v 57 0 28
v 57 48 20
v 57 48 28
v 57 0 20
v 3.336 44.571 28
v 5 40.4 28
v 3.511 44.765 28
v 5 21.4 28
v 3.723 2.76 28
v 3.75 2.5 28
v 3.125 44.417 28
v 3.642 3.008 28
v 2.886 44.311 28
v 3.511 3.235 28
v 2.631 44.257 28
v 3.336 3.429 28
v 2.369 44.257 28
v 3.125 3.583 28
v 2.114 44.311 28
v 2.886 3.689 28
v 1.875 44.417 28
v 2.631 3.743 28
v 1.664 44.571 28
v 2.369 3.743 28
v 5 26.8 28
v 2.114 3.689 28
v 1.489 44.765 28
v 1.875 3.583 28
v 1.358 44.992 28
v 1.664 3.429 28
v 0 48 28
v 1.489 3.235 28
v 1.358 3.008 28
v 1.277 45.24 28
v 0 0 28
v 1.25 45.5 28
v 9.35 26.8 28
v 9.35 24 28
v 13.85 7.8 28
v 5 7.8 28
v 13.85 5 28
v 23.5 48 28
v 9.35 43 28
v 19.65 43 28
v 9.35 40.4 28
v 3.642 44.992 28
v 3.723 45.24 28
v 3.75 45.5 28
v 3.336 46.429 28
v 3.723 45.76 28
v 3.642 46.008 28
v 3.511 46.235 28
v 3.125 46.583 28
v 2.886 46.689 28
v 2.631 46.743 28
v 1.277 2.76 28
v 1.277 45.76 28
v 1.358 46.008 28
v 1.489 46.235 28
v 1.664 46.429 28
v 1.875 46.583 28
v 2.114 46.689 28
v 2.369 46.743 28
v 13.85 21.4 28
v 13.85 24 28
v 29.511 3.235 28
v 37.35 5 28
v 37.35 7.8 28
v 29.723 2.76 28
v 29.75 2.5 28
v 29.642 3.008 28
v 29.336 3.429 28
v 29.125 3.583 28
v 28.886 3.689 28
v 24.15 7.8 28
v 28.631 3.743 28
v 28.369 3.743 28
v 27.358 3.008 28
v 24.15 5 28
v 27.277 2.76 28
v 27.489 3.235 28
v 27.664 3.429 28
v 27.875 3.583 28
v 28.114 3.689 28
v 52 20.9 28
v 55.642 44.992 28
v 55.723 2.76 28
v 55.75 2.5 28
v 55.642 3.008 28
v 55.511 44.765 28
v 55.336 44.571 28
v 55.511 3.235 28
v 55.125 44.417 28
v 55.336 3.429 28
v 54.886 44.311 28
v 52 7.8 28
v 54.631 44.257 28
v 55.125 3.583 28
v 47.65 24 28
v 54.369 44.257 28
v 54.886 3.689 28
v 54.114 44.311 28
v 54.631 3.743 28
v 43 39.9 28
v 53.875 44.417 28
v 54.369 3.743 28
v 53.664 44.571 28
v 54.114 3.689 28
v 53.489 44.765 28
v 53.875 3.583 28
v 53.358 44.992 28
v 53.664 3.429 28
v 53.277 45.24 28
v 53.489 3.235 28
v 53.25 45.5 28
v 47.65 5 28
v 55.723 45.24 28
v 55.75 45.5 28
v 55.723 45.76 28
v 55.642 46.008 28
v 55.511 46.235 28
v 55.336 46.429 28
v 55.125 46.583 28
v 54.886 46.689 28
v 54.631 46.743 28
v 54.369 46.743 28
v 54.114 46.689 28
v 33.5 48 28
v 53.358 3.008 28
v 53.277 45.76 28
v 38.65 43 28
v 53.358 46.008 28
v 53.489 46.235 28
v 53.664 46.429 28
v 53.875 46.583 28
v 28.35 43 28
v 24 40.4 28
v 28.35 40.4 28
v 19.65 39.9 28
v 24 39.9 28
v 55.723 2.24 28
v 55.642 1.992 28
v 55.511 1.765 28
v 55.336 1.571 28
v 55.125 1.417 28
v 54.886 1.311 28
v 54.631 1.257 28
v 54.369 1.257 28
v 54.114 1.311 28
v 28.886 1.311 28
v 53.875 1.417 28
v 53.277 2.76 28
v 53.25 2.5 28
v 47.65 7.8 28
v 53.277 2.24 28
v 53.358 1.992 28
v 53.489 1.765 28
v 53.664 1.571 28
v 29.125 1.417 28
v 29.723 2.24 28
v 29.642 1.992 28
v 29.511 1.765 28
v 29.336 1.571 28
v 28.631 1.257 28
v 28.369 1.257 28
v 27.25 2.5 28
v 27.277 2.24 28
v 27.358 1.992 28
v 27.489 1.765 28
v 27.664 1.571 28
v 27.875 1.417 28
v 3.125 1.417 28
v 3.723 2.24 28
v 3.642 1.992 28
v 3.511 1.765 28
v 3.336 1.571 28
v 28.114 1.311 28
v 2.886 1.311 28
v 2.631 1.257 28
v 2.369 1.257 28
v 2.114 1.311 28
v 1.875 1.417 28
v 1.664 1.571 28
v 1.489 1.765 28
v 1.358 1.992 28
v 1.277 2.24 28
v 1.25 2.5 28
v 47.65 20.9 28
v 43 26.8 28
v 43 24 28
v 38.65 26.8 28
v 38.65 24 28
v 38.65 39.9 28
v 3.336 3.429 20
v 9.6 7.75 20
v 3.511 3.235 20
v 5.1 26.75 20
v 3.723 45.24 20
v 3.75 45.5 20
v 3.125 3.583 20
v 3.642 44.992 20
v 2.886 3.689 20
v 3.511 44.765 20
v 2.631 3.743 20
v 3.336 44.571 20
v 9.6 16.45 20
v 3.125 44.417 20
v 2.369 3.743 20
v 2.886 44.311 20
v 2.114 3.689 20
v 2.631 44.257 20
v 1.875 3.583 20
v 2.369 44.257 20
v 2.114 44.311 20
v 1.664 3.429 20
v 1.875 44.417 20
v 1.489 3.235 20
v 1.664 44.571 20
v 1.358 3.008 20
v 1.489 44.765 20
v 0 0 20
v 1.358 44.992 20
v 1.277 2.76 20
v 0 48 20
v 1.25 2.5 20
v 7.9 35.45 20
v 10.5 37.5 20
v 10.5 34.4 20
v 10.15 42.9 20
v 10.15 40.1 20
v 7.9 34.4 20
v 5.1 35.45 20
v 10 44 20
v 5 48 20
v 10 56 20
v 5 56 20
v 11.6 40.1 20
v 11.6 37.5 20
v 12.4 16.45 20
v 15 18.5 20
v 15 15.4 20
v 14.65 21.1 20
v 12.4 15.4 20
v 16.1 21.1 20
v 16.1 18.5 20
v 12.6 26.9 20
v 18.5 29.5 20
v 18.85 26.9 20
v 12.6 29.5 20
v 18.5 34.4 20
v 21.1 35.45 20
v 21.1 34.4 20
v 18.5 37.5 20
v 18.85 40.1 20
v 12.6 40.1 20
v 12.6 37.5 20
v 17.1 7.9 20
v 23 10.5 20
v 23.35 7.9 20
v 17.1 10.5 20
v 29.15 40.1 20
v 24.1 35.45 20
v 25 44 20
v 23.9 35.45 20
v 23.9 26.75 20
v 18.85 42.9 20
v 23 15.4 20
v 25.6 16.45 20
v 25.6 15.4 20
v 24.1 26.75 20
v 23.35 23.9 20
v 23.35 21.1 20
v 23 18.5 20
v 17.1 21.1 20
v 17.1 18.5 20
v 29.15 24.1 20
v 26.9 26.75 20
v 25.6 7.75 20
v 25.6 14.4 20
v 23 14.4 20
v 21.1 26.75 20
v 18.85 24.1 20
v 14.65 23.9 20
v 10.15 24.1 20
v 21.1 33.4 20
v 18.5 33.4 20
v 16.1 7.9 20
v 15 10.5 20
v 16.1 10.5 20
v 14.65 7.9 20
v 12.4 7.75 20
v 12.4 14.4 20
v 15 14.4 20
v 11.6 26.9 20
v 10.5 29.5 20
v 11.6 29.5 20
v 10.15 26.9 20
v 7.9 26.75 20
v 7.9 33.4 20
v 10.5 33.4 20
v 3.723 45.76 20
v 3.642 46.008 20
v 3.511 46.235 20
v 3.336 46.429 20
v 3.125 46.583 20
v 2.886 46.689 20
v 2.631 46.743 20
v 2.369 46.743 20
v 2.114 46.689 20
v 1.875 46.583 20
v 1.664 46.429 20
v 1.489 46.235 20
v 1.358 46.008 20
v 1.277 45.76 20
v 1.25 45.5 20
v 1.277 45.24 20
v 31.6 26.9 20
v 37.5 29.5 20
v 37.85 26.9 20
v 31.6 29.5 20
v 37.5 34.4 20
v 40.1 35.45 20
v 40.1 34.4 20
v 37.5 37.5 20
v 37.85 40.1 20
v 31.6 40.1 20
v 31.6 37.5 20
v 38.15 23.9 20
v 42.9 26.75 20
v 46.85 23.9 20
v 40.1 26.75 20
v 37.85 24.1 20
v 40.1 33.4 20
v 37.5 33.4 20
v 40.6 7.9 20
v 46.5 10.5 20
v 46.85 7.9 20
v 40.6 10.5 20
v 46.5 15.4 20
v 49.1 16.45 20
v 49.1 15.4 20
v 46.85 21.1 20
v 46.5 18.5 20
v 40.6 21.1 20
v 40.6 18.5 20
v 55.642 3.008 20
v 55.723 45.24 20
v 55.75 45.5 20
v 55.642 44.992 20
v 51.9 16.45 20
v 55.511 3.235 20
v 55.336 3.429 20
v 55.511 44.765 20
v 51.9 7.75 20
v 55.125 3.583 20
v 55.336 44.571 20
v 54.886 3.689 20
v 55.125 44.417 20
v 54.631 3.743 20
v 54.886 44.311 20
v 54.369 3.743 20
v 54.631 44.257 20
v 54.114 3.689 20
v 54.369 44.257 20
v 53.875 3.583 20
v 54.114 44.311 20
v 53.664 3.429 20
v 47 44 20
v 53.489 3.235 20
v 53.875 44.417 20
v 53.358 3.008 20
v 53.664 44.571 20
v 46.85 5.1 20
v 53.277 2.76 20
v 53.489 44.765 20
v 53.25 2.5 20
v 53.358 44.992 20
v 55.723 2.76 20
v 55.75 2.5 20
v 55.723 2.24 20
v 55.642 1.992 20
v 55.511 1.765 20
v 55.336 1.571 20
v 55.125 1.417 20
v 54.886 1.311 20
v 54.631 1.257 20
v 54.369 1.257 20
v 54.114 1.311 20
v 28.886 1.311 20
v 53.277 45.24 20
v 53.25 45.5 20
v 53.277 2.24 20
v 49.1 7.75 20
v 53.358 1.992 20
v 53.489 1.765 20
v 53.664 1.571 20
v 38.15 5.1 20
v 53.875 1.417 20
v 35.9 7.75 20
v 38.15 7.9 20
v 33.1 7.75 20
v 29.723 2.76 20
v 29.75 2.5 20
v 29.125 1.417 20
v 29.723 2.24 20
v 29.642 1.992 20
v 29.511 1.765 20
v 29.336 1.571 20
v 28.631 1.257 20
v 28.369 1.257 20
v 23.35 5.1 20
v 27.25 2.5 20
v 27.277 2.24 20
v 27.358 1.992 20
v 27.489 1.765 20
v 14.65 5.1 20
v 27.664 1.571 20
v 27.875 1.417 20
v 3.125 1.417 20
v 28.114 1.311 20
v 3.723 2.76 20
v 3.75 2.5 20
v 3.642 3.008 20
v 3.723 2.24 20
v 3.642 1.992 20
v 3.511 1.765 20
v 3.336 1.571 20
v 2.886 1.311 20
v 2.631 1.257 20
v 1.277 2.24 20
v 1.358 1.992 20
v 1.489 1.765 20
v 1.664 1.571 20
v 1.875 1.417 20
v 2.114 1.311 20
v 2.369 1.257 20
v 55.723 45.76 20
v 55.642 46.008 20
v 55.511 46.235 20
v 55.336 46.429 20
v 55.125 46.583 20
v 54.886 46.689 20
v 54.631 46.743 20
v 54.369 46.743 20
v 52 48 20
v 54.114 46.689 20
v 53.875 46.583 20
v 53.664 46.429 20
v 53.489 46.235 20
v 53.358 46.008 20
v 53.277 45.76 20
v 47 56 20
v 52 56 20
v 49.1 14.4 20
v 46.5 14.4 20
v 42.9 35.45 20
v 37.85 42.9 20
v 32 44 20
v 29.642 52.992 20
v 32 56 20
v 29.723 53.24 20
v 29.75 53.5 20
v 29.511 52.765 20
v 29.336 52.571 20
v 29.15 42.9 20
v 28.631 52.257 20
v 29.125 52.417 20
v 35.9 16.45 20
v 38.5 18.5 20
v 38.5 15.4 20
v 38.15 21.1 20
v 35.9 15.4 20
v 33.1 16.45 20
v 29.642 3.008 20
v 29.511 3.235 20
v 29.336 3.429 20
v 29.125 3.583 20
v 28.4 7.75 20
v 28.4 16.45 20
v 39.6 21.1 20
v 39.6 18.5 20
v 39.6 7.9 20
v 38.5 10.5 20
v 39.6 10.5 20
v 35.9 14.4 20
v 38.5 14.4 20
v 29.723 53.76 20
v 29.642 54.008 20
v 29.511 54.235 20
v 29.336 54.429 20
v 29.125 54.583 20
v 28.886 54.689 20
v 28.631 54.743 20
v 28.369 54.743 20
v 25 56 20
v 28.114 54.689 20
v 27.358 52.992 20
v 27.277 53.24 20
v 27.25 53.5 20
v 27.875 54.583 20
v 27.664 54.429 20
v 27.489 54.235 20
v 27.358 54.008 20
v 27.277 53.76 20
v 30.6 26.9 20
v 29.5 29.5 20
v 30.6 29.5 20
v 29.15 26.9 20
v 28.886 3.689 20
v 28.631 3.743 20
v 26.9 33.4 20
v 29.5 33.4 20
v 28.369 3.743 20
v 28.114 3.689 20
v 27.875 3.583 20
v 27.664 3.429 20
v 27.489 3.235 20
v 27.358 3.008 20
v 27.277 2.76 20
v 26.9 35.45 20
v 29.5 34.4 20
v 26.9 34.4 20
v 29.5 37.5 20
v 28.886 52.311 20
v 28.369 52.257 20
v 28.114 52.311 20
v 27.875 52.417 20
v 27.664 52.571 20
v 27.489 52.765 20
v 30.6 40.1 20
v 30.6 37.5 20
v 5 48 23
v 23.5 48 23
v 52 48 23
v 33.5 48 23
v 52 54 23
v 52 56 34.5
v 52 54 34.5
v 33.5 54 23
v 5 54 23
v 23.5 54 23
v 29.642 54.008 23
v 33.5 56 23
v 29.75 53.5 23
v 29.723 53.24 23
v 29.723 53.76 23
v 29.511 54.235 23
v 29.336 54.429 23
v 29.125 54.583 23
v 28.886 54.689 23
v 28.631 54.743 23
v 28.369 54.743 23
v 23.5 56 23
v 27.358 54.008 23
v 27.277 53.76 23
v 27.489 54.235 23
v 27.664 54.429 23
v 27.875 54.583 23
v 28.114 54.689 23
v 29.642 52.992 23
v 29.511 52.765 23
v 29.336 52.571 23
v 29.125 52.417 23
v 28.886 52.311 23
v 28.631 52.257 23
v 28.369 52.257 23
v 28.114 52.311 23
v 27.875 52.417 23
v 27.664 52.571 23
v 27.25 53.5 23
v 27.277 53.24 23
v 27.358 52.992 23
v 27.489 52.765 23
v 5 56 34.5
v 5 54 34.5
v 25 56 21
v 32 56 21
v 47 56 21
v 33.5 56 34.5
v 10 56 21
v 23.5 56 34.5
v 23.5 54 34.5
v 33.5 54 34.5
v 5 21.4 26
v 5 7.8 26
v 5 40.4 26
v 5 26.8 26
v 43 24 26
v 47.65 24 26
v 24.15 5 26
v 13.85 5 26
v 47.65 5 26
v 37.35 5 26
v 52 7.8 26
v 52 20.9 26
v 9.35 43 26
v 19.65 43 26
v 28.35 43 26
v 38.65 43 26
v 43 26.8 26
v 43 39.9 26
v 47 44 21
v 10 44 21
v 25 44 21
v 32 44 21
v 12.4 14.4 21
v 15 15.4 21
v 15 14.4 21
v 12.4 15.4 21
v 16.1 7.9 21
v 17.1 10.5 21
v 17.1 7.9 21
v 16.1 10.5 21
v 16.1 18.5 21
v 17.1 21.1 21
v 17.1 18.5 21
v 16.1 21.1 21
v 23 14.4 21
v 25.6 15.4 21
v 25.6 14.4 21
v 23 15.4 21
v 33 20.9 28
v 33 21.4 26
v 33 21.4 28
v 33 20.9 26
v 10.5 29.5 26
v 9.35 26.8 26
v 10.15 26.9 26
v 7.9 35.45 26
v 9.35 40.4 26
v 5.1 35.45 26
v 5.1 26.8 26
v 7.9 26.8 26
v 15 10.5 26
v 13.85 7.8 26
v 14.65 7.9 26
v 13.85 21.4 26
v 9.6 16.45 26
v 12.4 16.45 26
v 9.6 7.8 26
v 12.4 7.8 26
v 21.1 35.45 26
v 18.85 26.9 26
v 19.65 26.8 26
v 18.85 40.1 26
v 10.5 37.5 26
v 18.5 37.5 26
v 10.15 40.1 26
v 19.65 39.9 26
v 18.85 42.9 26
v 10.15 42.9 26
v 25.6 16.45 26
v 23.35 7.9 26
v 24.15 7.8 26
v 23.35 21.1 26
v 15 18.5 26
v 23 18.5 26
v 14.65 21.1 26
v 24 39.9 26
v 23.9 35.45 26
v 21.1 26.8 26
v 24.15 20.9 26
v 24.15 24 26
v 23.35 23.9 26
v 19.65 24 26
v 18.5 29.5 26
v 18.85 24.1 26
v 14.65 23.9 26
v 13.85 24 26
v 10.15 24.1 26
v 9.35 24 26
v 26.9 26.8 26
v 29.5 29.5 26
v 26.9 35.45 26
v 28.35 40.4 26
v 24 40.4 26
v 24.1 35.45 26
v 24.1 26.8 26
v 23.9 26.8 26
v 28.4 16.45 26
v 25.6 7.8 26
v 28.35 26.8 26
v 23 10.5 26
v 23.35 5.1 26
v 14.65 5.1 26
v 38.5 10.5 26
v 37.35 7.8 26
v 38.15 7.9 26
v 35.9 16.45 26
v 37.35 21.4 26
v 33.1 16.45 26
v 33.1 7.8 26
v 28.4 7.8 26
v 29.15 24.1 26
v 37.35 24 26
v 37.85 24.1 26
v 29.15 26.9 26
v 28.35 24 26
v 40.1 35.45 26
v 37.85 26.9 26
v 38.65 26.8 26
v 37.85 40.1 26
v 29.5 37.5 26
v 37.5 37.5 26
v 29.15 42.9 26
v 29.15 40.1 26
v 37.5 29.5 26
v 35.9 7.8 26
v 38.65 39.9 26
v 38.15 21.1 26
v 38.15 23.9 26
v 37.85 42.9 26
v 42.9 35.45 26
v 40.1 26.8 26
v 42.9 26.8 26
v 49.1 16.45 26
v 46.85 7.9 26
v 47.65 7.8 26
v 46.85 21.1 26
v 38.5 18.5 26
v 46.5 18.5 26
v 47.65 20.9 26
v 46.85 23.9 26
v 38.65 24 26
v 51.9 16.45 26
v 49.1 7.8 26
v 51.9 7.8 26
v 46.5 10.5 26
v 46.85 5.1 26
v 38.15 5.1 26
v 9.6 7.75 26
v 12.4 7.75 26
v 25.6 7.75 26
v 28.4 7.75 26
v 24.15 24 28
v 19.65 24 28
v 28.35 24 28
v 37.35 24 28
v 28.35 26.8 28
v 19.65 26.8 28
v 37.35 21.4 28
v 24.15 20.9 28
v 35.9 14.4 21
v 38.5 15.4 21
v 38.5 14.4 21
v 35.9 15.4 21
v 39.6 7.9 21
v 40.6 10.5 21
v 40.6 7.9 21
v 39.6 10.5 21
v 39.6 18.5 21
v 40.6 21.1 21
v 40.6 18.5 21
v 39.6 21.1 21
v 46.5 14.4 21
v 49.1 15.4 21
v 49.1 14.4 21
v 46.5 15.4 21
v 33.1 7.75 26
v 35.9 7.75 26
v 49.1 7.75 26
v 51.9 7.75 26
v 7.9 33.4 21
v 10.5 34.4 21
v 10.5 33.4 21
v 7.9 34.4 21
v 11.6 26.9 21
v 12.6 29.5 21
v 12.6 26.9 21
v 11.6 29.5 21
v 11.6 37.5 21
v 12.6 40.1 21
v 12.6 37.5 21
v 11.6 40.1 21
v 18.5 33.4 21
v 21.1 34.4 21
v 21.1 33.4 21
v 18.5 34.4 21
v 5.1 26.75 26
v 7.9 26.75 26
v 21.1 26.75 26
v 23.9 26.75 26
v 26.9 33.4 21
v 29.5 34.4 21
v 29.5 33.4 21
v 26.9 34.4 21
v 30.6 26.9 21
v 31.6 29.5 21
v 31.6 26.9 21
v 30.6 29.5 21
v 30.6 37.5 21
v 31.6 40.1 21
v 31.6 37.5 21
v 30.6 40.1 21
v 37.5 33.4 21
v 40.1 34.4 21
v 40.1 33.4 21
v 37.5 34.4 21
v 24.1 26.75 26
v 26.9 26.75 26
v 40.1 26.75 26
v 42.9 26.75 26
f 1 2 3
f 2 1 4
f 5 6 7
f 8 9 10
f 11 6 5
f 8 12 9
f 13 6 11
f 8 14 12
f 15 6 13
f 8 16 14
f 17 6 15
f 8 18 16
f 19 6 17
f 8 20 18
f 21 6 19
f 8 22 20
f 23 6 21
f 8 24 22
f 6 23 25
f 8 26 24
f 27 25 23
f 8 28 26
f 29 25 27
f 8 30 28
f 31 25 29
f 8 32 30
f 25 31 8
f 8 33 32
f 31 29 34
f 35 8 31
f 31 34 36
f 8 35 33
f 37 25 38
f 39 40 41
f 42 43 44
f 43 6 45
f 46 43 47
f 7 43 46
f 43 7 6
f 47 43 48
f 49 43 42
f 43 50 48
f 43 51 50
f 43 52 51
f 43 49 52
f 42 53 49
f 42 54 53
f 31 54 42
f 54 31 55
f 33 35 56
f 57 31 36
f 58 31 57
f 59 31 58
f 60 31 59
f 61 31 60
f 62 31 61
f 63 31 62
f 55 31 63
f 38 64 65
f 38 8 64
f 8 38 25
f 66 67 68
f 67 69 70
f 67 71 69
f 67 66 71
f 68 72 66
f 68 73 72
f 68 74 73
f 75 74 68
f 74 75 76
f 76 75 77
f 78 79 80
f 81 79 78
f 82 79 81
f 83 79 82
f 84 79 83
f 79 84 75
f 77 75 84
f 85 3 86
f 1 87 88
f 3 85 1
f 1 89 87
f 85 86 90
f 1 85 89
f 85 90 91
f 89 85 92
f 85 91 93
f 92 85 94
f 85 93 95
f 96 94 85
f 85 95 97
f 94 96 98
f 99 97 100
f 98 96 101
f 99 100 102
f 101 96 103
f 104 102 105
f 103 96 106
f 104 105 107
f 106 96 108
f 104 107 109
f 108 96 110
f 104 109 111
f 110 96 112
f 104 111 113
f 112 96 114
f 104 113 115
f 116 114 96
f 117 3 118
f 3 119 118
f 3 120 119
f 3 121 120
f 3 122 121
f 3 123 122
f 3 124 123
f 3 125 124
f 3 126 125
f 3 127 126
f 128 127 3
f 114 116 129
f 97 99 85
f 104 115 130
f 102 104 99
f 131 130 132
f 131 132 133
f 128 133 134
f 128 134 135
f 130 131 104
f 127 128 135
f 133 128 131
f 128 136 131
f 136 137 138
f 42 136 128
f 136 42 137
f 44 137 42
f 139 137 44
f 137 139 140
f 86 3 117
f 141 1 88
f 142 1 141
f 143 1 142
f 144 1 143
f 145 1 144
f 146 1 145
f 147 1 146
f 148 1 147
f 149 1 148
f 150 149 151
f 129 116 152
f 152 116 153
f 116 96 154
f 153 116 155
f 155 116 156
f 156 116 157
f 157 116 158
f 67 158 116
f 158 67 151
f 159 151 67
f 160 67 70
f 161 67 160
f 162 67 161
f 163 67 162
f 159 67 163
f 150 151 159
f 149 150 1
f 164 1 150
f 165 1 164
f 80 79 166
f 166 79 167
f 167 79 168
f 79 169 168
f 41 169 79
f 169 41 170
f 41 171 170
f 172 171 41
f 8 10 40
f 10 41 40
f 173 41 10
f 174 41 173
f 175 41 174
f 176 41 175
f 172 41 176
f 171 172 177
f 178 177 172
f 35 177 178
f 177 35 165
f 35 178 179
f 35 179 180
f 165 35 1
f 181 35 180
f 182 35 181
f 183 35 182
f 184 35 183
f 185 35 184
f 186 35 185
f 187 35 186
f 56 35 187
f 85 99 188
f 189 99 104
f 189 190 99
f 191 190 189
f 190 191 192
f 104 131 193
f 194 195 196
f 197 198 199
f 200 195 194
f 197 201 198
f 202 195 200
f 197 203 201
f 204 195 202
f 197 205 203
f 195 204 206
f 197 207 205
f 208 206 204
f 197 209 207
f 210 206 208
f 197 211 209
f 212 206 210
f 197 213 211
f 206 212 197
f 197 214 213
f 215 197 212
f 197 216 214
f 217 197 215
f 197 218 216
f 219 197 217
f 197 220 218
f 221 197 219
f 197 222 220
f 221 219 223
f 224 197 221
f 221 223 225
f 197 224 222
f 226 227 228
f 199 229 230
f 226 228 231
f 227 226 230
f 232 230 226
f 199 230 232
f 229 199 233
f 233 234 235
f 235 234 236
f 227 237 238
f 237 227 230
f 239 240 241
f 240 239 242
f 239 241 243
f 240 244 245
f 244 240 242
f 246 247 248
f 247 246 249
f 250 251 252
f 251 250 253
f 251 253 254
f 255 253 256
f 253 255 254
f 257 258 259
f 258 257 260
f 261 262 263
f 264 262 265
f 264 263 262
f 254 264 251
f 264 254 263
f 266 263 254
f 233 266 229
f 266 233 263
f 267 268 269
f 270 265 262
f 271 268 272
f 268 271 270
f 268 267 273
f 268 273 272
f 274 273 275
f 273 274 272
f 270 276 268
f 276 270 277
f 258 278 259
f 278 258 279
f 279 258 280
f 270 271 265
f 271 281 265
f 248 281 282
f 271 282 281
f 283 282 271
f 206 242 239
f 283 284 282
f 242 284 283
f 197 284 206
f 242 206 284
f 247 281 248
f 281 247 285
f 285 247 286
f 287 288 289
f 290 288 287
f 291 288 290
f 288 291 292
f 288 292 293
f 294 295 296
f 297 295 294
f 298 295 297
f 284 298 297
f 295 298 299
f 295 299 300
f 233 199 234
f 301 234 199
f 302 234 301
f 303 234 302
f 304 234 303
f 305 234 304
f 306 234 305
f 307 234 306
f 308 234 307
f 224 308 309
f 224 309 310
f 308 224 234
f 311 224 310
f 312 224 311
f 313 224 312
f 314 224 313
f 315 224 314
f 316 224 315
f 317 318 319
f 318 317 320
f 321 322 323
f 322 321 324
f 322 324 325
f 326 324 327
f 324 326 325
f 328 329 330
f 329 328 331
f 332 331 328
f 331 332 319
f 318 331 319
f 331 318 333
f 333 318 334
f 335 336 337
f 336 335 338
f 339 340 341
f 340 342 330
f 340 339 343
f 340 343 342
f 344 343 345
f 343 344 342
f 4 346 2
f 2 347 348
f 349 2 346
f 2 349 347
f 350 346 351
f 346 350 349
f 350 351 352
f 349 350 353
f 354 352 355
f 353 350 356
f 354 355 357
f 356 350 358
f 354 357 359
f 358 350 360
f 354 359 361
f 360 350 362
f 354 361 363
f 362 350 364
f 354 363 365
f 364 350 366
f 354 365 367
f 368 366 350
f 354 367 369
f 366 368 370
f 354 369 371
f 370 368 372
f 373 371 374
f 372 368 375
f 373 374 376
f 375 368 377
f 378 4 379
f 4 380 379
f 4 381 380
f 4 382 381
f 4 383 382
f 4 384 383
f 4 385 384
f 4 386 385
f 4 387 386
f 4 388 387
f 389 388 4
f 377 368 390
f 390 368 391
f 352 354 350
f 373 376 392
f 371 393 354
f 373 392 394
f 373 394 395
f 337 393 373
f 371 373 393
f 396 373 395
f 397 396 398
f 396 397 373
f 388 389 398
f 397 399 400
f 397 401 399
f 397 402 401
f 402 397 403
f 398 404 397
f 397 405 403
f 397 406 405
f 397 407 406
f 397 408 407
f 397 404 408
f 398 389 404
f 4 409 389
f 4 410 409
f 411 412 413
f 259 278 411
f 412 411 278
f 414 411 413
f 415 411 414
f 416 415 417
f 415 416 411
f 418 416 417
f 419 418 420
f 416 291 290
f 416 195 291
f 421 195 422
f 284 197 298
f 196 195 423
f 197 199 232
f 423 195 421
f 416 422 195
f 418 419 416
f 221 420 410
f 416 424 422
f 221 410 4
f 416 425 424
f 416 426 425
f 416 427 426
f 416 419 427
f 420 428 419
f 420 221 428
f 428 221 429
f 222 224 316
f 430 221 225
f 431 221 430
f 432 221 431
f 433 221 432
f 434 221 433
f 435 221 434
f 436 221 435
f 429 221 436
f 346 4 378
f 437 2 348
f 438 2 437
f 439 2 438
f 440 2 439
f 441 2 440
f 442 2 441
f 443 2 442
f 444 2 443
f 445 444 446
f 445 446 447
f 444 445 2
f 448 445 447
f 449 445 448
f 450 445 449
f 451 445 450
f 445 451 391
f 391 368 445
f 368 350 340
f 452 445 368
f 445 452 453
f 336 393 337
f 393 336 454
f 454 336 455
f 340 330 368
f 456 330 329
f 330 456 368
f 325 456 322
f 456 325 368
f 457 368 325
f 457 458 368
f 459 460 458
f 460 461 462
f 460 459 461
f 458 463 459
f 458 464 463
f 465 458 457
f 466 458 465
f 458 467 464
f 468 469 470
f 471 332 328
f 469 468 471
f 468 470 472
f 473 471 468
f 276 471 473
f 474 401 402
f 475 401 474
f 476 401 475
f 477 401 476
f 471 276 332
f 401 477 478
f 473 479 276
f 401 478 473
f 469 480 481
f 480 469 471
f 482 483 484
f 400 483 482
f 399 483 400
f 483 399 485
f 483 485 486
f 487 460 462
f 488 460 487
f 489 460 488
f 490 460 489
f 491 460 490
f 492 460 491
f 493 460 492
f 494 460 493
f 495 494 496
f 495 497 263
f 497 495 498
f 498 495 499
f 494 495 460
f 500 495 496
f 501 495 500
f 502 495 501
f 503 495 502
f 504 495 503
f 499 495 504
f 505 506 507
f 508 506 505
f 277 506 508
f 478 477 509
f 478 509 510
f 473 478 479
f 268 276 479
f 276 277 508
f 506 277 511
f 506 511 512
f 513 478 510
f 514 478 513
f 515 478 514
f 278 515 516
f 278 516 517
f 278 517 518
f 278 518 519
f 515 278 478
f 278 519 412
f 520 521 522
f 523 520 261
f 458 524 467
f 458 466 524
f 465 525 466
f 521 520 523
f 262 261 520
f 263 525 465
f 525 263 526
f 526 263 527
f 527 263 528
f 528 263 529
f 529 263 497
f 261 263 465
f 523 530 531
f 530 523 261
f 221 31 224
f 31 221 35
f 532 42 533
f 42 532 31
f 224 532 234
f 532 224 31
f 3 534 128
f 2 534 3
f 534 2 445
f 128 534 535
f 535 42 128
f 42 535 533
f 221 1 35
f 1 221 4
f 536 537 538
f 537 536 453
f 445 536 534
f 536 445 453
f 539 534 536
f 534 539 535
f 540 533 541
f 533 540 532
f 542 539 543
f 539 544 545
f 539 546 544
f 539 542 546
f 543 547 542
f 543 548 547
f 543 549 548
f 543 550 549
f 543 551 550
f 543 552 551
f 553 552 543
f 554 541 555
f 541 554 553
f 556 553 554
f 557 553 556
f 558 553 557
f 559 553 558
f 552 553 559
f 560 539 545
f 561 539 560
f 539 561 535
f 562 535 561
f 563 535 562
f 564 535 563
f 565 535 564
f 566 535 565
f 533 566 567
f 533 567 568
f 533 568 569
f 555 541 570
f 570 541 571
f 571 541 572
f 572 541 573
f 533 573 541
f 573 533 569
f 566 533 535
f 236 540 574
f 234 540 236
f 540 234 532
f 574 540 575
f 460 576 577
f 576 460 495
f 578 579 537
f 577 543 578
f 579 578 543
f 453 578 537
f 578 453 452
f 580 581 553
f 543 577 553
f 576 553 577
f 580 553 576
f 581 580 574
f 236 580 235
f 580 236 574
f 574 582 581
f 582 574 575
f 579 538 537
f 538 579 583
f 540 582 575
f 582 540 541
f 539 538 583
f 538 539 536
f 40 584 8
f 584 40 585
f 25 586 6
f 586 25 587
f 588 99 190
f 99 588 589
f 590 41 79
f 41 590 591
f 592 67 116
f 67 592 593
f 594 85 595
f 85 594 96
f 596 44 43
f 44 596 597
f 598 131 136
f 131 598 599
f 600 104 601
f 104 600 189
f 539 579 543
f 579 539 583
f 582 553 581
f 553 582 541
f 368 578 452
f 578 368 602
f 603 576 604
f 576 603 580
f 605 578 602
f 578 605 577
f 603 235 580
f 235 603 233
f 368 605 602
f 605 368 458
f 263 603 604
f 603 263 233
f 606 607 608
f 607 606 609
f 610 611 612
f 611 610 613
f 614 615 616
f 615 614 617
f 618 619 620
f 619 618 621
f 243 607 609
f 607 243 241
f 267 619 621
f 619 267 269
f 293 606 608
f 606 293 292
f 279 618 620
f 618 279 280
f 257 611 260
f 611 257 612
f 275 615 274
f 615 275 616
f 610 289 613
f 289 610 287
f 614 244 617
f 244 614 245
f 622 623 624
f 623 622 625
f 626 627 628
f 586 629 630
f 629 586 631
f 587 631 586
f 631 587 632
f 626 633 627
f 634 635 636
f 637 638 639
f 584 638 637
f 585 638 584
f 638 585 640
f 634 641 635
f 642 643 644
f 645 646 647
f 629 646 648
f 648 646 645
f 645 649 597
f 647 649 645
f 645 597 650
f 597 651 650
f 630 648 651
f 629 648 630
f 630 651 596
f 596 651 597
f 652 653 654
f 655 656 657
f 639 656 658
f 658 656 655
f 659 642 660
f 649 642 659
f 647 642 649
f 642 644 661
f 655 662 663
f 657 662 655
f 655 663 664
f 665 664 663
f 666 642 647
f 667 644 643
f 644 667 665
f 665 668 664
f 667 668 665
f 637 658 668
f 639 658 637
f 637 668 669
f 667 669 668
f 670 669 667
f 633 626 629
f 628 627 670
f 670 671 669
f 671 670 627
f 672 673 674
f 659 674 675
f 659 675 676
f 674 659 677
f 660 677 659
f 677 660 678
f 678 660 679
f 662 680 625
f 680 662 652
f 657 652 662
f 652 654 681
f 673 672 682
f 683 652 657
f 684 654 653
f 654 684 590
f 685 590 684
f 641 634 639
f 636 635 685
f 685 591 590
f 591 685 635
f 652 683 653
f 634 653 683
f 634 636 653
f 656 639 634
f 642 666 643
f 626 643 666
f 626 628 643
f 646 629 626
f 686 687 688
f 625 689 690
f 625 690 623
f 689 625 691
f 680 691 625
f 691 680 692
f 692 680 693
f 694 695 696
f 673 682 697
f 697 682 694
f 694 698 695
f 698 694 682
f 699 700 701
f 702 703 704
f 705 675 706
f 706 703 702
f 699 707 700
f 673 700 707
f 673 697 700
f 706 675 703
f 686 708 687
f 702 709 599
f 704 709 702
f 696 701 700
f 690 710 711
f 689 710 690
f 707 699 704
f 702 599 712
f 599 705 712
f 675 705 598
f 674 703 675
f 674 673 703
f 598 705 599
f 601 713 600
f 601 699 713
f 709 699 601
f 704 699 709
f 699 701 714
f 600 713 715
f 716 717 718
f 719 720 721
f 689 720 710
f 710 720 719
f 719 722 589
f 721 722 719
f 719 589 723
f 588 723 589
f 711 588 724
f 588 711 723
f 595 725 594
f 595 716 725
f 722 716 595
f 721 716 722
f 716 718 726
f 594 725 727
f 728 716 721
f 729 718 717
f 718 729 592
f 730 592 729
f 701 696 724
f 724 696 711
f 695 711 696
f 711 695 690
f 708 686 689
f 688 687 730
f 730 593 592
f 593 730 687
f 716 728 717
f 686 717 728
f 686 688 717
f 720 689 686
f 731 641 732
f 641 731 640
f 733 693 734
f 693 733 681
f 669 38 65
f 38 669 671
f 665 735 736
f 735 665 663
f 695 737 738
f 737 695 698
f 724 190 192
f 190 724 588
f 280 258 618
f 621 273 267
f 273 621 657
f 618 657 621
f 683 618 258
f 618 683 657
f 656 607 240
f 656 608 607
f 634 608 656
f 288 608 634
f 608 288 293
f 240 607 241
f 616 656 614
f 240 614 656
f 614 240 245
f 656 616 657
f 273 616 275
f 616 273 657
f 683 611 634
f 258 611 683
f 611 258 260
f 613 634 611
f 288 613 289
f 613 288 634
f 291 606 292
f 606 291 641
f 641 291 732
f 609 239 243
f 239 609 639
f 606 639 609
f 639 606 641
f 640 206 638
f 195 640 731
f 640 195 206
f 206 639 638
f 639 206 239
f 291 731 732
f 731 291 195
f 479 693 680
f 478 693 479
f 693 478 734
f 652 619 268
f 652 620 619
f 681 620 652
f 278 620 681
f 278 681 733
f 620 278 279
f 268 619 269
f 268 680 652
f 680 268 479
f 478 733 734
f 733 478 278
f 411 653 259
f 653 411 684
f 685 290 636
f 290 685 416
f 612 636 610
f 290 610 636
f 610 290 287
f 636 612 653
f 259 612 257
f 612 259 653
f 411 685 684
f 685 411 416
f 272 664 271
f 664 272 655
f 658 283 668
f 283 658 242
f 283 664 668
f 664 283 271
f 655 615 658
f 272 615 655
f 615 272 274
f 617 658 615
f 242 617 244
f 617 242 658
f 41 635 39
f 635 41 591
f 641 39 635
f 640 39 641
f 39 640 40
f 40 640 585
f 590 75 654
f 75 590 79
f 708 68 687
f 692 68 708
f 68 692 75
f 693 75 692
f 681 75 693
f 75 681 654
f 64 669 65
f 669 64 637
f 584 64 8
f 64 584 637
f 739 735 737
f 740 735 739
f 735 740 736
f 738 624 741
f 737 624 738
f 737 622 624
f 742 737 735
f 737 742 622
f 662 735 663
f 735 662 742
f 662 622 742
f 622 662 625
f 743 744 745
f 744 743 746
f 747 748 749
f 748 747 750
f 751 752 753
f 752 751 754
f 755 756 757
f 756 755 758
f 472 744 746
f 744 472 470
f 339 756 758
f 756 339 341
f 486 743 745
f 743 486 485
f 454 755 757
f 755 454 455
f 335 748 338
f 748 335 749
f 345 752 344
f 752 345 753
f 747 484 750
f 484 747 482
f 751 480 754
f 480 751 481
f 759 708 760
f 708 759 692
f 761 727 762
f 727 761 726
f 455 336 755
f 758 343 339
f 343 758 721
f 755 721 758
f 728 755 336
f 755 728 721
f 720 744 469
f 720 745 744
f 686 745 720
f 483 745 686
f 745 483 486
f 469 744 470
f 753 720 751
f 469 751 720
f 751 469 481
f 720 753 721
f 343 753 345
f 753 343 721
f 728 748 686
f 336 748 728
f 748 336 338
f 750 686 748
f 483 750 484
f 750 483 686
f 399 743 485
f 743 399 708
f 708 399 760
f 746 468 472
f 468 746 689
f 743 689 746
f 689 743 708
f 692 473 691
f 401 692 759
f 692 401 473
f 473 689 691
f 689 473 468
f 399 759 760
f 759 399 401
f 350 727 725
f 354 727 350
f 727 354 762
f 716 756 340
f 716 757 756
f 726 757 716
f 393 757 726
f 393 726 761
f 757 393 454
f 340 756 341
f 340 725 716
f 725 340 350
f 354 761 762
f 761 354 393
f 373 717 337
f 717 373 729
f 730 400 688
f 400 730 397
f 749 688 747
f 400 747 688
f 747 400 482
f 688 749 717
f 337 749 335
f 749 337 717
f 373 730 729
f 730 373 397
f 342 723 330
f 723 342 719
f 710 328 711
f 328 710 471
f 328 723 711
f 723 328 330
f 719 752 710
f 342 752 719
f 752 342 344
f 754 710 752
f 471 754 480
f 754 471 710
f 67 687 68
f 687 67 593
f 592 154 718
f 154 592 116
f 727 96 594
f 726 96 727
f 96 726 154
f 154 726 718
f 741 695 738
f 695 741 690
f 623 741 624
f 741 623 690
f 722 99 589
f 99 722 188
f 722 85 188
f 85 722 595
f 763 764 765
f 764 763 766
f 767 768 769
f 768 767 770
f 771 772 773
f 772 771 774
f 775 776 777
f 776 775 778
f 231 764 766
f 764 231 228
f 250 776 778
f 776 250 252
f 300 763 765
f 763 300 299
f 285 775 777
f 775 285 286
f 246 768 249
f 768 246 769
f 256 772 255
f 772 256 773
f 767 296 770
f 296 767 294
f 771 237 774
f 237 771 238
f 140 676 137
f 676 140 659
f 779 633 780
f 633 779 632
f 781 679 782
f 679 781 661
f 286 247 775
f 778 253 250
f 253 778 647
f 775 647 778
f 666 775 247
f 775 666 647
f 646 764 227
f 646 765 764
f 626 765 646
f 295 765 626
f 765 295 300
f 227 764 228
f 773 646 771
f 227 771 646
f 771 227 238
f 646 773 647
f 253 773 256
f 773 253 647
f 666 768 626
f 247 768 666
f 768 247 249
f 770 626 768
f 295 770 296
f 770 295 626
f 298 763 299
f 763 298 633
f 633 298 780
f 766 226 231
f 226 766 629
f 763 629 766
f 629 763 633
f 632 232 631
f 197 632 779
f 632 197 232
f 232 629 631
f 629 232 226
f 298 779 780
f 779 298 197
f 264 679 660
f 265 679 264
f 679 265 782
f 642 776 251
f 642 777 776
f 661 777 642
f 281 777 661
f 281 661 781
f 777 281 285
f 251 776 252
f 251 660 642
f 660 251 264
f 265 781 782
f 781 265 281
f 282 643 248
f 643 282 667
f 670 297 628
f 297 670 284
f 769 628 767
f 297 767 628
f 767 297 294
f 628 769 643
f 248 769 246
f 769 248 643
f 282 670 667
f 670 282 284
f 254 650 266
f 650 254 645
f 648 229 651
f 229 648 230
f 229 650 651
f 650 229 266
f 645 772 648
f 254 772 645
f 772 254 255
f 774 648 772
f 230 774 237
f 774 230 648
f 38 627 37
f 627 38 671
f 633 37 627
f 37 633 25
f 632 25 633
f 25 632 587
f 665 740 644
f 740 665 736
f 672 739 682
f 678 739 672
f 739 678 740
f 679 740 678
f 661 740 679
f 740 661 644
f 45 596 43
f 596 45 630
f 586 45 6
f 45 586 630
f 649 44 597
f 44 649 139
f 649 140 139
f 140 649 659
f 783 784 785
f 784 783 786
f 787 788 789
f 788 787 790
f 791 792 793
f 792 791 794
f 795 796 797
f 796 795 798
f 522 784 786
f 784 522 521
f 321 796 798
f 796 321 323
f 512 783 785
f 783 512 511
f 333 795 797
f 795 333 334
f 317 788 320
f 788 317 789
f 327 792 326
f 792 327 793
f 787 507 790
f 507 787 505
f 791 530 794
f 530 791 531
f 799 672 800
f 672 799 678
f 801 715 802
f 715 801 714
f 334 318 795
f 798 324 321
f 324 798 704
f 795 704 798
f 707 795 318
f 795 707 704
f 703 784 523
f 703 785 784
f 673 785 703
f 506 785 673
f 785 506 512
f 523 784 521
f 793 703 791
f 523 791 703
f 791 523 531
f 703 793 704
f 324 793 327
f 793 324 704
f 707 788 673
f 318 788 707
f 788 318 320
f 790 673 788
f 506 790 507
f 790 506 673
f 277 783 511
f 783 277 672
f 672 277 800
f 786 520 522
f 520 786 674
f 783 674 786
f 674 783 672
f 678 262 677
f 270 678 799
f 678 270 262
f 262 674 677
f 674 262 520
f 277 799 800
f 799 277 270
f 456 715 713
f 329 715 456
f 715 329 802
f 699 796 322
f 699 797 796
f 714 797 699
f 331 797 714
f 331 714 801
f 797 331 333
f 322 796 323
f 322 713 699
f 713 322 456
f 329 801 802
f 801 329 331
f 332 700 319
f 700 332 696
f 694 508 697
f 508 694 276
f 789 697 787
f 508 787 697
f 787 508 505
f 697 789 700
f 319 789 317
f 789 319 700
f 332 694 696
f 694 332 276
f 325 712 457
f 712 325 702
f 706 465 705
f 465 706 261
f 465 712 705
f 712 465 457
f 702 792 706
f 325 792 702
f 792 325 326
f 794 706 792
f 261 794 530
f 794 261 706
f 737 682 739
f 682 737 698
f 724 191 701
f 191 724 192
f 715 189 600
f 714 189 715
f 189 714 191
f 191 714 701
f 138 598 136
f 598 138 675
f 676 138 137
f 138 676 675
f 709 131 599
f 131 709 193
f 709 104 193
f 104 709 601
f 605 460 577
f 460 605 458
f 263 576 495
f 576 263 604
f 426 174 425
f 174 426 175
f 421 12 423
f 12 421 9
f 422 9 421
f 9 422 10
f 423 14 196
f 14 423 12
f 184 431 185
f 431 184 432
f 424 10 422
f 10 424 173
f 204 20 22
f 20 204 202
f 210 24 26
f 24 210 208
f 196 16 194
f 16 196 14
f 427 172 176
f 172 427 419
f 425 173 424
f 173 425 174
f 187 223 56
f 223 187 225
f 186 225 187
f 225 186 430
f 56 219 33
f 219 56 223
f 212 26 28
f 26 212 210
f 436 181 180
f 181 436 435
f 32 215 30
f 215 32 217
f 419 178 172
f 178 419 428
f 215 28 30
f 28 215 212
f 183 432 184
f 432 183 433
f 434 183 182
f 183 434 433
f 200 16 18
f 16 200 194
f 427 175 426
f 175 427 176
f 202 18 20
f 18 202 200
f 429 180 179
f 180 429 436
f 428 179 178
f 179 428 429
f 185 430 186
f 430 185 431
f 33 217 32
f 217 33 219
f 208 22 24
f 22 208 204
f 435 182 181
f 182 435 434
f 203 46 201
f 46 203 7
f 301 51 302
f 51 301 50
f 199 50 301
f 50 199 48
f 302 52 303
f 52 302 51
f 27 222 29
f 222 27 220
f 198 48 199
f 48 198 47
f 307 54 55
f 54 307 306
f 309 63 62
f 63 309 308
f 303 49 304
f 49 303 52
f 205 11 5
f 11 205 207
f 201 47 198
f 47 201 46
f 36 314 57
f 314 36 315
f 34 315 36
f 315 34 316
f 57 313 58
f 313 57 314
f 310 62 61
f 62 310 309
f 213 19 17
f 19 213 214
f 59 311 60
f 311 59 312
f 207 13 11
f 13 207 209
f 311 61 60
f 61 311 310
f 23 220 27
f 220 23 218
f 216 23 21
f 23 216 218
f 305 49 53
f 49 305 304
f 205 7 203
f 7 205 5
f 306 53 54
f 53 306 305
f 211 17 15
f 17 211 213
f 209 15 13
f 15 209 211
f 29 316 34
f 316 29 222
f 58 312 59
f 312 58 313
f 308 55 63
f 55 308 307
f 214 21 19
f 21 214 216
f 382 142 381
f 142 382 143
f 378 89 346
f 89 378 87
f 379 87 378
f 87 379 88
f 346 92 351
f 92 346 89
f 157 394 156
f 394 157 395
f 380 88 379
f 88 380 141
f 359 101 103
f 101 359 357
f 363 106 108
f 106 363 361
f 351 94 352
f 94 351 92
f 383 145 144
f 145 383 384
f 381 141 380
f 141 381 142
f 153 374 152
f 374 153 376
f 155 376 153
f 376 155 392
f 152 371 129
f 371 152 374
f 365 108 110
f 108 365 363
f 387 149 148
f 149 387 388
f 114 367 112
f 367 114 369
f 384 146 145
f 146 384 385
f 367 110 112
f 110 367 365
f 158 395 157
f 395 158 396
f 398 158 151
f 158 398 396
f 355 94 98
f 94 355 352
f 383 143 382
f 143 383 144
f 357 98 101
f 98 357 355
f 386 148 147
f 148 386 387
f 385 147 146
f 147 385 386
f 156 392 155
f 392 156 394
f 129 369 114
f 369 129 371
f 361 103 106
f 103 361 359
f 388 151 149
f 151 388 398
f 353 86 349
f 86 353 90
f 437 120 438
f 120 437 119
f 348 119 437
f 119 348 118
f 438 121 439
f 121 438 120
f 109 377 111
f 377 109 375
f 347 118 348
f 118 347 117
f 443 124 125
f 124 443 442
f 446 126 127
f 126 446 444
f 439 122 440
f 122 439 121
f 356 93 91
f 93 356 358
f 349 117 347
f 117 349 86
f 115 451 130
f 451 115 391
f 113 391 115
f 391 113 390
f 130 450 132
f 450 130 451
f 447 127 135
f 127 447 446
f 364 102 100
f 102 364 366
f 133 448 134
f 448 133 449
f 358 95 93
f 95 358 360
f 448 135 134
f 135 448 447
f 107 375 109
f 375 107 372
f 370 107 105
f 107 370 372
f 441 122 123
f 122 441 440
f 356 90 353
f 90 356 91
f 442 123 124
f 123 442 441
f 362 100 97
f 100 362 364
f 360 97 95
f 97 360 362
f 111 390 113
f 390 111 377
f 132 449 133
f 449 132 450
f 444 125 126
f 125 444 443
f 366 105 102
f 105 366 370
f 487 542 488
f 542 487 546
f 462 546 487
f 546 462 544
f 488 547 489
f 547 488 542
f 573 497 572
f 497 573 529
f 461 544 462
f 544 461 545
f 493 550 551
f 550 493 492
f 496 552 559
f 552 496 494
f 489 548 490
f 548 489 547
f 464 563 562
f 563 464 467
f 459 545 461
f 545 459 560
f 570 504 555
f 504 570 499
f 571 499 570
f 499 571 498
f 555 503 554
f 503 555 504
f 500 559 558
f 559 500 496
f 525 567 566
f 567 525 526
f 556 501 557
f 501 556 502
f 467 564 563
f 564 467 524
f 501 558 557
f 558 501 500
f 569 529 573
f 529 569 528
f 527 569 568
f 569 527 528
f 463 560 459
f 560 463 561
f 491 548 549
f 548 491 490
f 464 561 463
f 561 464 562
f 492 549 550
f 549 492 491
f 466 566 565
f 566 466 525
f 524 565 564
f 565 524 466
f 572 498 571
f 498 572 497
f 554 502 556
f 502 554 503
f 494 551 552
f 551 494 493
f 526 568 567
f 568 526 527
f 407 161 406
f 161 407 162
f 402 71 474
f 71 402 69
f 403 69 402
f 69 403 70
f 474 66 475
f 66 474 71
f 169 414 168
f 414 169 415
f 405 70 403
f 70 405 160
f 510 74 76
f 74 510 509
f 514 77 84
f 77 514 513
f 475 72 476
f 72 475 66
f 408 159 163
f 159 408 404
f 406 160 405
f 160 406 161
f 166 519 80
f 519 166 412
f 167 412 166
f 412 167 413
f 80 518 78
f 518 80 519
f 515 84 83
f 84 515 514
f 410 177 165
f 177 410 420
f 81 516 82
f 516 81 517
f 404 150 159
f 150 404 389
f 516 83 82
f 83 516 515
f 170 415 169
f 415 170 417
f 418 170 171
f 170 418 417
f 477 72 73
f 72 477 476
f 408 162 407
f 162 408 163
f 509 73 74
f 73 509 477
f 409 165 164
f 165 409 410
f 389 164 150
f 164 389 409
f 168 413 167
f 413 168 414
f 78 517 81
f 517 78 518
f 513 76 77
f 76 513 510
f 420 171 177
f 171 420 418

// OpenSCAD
// file: key_definitions.scad
/*
 * Standard 1u keycap size
 *  Keycap placeholder space: 19.05 x 19.05mm
 *  Keycap size: 18 x 18mm
 *  Plate switch hole: 14 x 14mm
 *  Distance between switch holes: 5.05mm
 */

U1 = 18; /* Default */
U125 = U1 * 1.25; /* 22.5, Modifier */
U15 = U1 * 1.50;  /* 27.0, Modifier, Tab, '\|'' */
U175 = U1 * 1.75; /* 31.5, Caps Lock */
U2 = U1 * 2.00;   /* 36.0, Num Plus, Num Enter, Backspace */
U225 = U1 * 2.25; /* 40.5, Left Shift */
U275 = U1 * 2.75; /* 49.5, Right Shift */
U625 = U1 * 6.25; /* 112.5, Space */
// main file
include <key_definitions.scad>
use <key_support.scad>

$fn = 30;

KEYS = [
    [U1, U1],
    [U15, U1],
];

border = 5;
width = 47 + (border * 2);

DrawTopPlate = 0;
DrawKeyboardBody = 1;
DrawBottomPlate = 0;
DrawProto = 0;

if (DrawTopPlate) {
    translate([0, 0, 50])
        difference() {
            KeyboardTopPlate(border, width, KEYS);
            screwHole(border, width, KEYS,
                holeDepth = getTopPlateDepth(), cornerDepth = 3);
        }
}

if (DrawKeyboardBody) {
    translate([0, 0, 20])
        difference() {
            KeyboardBody(border, width, KEYS);
            screwHole(border, width, KEYS);
        }
}

if (DrawBottomPlate) {
    translate([0, 0, -getBottomPlateDepth()])
        difference() {
            KeyboardBottomPlate(border, width, KEYS);
            screwHole(border, width, KEYS,
                holeDepth = getBottomPlateDepth(),
                cornerDepth = getBottomPlateDepth()/2,
                screwPositionTop = false);
        }
}

if (DrawProto) {
    translate([0, 0, 5])
        difference() {
            KeyboardProto(border, width, KEYS);
            screwHole(border, width, KEYS);
        }
}
